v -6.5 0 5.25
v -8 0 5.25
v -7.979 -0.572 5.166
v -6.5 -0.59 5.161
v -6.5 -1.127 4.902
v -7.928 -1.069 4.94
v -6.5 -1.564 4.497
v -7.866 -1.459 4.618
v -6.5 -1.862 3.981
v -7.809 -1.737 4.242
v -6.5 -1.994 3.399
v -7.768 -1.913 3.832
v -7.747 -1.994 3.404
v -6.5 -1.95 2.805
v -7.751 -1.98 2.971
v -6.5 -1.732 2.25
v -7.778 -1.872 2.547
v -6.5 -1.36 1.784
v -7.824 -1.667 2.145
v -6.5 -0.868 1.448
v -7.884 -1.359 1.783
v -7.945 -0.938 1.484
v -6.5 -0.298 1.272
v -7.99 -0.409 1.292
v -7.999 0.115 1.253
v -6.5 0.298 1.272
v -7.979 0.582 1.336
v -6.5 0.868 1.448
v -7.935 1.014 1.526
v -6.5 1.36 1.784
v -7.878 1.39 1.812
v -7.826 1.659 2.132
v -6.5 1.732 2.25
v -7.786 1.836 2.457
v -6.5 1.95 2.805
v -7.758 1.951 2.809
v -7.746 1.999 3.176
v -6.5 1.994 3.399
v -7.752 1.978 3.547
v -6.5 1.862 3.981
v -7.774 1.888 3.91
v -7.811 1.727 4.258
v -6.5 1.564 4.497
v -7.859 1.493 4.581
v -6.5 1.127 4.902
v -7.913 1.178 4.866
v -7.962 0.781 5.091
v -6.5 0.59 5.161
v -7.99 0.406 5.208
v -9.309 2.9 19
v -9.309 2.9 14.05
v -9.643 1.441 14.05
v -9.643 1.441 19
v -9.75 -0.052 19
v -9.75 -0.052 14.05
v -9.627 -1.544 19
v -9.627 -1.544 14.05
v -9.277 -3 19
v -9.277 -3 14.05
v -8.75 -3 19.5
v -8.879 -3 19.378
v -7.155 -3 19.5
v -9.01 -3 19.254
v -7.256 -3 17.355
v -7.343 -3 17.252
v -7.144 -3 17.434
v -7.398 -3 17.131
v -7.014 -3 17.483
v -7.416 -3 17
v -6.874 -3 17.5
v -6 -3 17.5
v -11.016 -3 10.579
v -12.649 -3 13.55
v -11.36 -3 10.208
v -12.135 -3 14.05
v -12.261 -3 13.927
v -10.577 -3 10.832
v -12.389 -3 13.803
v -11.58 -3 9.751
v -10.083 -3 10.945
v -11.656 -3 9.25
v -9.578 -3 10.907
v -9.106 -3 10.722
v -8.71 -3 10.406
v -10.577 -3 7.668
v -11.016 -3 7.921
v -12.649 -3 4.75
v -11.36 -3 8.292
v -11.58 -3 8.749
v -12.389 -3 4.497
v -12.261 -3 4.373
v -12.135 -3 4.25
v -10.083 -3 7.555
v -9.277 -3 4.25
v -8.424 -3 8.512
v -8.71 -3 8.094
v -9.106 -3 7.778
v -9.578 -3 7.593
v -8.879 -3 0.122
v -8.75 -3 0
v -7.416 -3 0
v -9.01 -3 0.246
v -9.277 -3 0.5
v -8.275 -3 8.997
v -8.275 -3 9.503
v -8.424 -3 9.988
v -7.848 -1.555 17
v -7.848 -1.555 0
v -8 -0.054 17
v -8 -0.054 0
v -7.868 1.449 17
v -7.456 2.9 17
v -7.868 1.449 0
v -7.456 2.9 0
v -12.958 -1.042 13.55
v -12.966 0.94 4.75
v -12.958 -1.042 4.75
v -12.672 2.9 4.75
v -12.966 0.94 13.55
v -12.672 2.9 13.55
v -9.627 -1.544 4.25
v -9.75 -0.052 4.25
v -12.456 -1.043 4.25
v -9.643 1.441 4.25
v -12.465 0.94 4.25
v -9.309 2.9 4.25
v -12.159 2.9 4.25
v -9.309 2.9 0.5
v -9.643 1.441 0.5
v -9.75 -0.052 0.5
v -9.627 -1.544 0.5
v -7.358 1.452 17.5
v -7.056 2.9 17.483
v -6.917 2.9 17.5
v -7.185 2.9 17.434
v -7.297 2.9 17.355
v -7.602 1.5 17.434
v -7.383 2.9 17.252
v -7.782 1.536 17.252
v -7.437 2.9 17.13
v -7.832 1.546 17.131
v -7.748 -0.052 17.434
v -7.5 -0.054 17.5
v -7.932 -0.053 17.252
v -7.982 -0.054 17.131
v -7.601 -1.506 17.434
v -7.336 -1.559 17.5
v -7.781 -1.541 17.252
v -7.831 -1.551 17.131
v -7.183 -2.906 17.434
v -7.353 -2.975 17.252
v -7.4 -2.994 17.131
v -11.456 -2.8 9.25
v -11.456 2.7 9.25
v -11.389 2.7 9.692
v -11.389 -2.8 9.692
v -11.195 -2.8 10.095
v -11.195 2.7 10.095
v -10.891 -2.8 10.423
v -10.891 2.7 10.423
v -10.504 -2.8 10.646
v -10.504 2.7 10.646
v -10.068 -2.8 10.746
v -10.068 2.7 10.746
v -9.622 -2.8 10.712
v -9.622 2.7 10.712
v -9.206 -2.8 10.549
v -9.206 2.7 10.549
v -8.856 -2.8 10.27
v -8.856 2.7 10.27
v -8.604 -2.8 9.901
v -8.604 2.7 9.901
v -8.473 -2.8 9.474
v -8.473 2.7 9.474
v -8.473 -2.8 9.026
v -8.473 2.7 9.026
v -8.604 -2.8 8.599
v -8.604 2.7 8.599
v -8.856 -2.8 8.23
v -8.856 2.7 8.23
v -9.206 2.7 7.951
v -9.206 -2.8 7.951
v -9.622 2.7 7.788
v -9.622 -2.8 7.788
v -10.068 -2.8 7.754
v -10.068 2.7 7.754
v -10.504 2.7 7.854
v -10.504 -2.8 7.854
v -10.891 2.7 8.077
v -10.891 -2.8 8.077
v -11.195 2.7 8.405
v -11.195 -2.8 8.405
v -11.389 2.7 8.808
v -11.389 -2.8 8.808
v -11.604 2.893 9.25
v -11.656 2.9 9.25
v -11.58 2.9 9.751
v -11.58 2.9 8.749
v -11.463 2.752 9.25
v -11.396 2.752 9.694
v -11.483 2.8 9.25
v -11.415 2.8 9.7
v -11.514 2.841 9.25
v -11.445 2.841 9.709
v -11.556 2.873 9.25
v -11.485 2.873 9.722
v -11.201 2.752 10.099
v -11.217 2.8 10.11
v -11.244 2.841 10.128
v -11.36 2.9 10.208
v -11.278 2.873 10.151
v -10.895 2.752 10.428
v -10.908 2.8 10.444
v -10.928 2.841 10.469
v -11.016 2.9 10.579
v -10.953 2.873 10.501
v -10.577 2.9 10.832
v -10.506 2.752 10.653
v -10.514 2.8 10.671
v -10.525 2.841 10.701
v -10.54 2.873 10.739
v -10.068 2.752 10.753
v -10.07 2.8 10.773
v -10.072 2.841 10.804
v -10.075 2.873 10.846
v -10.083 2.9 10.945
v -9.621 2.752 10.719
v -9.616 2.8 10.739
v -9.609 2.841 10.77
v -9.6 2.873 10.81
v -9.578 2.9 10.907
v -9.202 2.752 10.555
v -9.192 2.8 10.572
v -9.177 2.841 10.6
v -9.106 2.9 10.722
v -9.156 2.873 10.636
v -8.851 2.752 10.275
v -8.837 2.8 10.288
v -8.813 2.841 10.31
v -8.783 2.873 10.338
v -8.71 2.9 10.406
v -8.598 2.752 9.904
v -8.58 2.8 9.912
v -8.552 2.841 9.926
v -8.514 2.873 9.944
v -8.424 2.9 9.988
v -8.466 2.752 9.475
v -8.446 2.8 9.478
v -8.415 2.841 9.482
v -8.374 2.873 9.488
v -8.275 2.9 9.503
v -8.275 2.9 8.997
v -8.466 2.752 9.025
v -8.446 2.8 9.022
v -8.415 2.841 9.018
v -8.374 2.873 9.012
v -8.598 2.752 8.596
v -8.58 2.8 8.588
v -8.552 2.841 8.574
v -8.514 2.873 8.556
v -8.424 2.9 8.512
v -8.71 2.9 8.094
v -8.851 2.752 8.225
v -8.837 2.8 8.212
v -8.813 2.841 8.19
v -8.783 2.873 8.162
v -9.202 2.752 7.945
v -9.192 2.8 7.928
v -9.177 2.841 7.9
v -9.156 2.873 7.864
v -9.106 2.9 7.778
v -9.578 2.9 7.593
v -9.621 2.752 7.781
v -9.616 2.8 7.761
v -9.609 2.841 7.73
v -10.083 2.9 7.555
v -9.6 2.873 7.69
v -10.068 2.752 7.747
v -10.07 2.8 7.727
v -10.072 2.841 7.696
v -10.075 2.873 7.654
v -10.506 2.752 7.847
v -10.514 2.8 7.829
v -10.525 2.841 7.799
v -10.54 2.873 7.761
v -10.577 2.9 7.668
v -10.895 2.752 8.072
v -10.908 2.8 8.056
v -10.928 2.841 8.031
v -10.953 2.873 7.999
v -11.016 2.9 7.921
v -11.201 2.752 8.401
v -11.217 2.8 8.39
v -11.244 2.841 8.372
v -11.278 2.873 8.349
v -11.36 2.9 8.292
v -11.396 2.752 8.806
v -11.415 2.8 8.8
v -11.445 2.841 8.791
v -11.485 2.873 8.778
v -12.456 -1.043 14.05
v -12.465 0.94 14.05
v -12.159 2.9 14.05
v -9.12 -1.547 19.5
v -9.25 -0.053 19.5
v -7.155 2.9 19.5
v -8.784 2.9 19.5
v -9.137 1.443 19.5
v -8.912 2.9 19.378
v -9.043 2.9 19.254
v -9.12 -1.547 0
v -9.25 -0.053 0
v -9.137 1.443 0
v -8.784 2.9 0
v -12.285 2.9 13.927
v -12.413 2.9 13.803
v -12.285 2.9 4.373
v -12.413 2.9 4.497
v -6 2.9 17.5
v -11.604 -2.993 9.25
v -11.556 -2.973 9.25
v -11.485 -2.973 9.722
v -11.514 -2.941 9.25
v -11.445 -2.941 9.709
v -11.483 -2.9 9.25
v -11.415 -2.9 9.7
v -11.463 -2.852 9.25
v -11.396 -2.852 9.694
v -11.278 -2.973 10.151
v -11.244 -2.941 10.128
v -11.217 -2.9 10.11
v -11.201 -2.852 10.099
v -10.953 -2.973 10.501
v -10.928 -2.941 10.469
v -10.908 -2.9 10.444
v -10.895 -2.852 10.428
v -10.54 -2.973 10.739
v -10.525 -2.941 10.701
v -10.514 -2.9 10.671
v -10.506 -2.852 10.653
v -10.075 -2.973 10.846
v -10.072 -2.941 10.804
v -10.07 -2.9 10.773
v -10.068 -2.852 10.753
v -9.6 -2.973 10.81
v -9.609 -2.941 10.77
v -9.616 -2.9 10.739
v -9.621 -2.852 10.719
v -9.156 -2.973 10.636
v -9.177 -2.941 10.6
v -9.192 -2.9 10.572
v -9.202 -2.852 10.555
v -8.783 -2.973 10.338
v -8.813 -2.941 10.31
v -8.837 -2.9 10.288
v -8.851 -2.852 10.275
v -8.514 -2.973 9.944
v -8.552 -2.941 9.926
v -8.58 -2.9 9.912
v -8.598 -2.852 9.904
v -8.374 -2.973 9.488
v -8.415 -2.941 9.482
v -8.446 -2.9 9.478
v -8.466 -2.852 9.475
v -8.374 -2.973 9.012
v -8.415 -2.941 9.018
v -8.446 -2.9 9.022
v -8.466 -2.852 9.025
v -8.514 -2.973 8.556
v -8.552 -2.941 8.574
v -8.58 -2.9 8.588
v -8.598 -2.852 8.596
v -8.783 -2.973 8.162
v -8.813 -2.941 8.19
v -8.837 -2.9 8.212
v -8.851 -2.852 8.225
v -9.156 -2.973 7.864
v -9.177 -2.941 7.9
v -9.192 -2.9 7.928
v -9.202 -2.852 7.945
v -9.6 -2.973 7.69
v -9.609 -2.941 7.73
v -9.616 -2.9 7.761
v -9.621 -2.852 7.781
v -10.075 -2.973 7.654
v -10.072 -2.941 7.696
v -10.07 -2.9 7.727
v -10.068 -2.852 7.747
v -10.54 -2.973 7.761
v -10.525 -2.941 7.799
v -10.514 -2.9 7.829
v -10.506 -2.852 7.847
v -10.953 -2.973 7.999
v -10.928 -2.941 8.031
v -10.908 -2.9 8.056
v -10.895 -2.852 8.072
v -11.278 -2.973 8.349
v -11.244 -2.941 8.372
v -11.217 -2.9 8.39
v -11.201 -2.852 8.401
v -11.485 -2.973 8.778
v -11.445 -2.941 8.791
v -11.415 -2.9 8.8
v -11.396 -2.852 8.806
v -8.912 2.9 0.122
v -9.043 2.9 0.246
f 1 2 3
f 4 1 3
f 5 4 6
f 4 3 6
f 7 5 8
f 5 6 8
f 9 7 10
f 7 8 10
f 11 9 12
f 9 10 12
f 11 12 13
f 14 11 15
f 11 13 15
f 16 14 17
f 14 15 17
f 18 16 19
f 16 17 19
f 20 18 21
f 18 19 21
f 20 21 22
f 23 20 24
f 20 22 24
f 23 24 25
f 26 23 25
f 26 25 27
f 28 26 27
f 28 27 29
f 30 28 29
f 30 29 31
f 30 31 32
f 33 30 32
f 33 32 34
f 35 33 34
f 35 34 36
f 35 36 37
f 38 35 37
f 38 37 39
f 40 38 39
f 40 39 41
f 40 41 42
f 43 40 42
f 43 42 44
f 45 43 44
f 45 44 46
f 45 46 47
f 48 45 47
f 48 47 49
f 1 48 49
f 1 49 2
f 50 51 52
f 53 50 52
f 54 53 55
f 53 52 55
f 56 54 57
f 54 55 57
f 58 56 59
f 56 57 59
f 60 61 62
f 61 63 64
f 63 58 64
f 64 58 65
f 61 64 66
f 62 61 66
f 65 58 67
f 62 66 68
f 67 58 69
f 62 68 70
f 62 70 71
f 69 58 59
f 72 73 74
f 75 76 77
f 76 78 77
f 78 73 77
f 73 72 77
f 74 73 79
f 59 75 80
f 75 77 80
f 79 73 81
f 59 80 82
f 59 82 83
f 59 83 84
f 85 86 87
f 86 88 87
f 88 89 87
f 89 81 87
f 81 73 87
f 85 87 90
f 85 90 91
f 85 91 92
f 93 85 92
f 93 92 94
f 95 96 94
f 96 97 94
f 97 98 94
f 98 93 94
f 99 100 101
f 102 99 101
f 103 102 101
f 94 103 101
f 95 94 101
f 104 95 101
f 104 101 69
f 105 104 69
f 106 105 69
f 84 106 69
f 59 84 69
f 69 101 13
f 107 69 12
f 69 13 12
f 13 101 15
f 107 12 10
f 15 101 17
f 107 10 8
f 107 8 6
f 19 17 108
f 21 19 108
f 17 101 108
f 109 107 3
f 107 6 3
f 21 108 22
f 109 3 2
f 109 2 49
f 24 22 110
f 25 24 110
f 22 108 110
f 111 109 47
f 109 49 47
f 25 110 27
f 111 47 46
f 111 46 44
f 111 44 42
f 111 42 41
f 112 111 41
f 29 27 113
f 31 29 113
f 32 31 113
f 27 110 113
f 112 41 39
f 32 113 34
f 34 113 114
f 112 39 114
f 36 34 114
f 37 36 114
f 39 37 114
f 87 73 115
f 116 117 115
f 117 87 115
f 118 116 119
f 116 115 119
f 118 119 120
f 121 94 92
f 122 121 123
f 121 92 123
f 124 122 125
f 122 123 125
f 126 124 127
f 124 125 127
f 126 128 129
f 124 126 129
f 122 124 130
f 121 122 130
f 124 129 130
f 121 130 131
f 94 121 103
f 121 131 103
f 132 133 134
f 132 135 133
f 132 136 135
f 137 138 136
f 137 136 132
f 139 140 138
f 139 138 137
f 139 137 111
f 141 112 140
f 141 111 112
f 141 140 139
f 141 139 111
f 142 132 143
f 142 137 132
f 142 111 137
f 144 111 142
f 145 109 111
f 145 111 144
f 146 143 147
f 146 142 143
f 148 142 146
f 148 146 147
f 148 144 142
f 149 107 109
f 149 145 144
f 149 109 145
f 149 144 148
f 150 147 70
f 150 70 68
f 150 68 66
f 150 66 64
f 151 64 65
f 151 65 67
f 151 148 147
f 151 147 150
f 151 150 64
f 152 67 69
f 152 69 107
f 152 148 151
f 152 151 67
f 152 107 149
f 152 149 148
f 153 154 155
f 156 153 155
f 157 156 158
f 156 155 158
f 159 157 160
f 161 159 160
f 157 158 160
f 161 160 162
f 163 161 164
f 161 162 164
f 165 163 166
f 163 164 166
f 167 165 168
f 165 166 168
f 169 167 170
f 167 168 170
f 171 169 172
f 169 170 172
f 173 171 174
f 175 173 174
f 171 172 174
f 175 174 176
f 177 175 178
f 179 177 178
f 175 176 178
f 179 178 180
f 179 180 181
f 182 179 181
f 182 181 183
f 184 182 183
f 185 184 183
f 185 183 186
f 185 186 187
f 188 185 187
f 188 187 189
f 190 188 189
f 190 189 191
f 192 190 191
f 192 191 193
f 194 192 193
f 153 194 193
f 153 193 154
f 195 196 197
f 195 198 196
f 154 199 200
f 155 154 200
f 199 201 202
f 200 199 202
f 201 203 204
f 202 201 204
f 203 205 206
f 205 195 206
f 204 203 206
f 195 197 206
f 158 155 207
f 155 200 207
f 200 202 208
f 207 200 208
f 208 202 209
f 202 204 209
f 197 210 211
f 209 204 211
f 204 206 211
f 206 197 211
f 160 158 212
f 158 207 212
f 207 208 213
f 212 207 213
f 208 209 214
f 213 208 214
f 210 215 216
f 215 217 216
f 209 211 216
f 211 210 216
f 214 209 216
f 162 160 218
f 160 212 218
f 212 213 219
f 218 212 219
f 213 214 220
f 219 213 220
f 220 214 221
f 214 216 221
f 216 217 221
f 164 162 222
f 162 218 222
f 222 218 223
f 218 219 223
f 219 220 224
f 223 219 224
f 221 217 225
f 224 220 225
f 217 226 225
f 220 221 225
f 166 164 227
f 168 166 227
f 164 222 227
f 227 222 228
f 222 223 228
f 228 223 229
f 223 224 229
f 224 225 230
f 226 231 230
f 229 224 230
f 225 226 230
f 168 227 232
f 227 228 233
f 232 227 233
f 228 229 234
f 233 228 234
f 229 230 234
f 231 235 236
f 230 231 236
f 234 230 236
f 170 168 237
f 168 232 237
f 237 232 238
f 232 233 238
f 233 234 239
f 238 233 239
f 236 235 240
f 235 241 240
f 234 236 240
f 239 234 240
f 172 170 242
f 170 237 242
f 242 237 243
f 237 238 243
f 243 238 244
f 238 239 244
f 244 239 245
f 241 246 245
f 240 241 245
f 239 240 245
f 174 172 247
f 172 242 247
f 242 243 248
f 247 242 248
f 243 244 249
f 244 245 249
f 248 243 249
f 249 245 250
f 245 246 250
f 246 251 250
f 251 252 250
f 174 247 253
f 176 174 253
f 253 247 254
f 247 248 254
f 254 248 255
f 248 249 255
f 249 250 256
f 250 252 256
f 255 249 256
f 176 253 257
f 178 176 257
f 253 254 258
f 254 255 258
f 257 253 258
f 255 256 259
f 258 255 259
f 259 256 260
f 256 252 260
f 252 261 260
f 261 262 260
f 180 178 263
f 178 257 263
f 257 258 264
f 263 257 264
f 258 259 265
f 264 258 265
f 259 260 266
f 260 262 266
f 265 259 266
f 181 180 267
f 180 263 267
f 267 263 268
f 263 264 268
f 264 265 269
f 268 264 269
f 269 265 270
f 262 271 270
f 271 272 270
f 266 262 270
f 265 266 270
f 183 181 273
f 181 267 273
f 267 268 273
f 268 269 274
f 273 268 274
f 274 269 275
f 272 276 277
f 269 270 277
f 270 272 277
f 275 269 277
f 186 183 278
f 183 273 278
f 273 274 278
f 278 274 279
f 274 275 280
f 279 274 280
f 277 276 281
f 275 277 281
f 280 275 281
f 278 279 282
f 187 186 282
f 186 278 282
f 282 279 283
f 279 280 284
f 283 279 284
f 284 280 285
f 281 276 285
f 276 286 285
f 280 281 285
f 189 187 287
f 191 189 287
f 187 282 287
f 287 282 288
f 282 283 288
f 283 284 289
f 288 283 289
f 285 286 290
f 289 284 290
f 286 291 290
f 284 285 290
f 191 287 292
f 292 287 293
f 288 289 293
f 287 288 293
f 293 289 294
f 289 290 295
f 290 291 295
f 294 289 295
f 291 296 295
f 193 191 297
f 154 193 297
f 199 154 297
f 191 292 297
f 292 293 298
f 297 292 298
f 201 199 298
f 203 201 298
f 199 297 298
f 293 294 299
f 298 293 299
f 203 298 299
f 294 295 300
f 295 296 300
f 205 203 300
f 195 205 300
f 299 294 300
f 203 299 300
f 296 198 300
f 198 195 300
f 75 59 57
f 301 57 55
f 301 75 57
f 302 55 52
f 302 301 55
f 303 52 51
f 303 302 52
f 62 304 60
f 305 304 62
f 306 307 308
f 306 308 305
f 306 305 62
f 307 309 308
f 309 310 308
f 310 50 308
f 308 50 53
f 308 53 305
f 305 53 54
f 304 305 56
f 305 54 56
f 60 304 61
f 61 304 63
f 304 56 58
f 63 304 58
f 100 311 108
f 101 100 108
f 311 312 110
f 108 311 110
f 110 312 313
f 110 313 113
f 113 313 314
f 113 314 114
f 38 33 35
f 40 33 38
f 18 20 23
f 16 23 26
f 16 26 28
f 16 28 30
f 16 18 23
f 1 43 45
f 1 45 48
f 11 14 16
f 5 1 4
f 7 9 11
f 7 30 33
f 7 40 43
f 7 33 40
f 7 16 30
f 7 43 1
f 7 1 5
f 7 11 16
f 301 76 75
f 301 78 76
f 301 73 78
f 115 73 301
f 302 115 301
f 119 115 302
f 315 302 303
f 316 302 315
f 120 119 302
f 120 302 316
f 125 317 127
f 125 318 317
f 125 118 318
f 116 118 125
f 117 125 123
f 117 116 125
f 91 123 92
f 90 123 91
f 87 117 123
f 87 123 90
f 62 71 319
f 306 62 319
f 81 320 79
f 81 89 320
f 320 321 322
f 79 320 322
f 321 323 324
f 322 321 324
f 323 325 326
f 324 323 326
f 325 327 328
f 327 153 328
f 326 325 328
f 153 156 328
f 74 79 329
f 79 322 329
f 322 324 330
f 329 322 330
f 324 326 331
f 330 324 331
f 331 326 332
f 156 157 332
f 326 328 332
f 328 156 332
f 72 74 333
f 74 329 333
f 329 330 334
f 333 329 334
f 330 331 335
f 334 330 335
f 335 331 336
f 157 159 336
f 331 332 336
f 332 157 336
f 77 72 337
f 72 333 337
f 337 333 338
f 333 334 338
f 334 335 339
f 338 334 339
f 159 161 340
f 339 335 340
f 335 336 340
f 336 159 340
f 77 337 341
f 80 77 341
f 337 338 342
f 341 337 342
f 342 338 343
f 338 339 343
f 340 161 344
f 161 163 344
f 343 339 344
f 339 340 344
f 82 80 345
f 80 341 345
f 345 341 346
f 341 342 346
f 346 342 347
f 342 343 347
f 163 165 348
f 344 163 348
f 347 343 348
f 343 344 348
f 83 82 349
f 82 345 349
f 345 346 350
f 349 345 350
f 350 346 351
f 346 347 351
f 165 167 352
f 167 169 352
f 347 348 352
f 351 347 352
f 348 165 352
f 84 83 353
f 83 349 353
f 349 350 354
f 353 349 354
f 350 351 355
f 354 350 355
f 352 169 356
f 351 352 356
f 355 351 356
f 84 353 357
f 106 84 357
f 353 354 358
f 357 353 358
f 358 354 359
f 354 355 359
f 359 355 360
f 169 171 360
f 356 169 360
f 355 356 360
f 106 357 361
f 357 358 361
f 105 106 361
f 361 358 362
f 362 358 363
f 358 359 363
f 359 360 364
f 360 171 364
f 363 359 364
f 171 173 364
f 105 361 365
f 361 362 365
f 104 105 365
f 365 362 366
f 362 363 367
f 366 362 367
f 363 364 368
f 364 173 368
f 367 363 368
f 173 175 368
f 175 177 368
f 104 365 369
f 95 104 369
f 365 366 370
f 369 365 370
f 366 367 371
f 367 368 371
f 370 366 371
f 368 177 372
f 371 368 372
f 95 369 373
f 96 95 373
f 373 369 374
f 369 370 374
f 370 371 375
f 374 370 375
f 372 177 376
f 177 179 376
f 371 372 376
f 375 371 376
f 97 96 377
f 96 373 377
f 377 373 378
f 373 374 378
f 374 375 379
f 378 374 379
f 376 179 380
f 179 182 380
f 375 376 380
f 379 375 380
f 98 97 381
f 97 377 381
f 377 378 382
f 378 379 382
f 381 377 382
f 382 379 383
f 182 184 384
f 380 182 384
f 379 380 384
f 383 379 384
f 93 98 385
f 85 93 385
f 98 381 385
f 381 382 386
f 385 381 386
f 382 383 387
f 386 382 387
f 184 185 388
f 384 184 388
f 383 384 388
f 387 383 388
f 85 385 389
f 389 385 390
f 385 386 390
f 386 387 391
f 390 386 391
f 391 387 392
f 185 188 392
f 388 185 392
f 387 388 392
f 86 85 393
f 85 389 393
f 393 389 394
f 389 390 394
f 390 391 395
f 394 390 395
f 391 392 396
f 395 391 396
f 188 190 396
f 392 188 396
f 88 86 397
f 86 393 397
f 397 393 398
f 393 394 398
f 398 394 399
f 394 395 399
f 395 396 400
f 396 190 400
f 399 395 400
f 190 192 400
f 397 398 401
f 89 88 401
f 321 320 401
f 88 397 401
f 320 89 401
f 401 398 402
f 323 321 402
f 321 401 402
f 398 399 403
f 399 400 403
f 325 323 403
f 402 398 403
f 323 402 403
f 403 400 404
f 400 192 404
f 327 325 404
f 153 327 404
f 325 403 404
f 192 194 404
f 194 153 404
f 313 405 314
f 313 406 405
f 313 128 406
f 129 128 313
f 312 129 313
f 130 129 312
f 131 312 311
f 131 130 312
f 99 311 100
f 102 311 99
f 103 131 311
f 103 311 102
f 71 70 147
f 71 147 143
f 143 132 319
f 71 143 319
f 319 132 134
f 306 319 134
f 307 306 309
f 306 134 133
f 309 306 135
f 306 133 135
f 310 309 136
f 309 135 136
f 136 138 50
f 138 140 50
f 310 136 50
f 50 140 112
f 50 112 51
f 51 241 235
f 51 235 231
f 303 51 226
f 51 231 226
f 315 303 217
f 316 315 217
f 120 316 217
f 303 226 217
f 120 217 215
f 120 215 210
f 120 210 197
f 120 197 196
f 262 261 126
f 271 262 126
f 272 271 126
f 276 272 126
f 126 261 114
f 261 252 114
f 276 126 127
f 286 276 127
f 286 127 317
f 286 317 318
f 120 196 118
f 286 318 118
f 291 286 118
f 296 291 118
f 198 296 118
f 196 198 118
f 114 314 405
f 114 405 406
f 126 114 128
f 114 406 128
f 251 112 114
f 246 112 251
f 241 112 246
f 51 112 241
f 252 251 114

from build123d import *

# Parameters (mm, degrees)
EXTRUDE_2_DEPTH     = 19.5
SKETCH_3_R          = 2
EXTRUDE_3_DEPTH     = 1.5
SKETCH_4_W          = 9.8
SKETCH_4_H          = 5.9
EXTRUDE_4_DEPTH     = 0.5
SKETCH_4_3_W        = 9.8
SKETCH_4_3_H        = 5.9
EXTRUDE_5_DEPTH     = 8
CUT_EXTRUDE_1_DEPTH = 23.835608234
SKETCH_7_R          = 1.5
CUT_EXTRUDE_2_DEPTH = 25.167333429
FILLET_1_R          = 0.2
SKETCH_8_W          = 2
SKETCH_8_H          = 5.9
EXTRUDE_6_DEPTH     = 2
CHAMFER_1_SIZE2     = 2
CHAMFER_1_SIZE      = 1.154700538
FILLET_2_R          = 0.5
CHAMFER_2_SIZE      = 0.5


with BuildPart() as part:
    # 스케치2 → 보스-돌출2 (new body)
    with BuildSketch(Plane.XY):
        with BuildLine():
            Line((-7.455870171, 2.9), (-9.308732459, 2.9))
            ThreePointArc((-9.308732459, 2.9), (-9.749858874, -0.052458871), (-9.276987658, -3))
            Line((-9.276987658, -3), (-7.416198487, -3))
            ThreePointArc((-7.416198487, -3), (-7.999819157, -0.053790897), (-7.455870171, 2.9))
        make_face()
    extrude(amount=EXTRUDE_2_DEPTH)

    # 스케치3 → 보스-돌출3 (add)
    with BuildSketch(Plane(origin=(-8, 0, 0), x_dir=(0, 0, -1), z_dir=(1, 0, 0))):
        with Locations(Location((-3.25, 0, 0), (0, 0, 180))):
            Circle(SKETCH_3_R)
    extrude(amount=EXTRUDE_3_DEPTH)

    # 스케치4 → 보스-돌출4 (add, symmetric)
    with BuildSketch(Plane.ZY.offset(9.75)):
        with Locations((9.15, -0.05)):
            Rectangle(SKETCH_4_W, SKETCH_4_H)
    extrude(amount=EXTRUDE_4_DEPTH, both=True)

    # 스케치4<3> → 보스-돌출5 (add)
    with BuildSketch(Plane.ZY.offset(9.75)):
        with Locations((9.15, -0.05)):
            Rectangle(SKETCH_4_3_W, SKETCH_4_3_H)
    extrude(amount=EXTRUDE_5_DEPTH)

    # 스케치6 → 컷-돌출1 (cut, through all)
    with BuildSketch(Plane.XY.offset(14.05)):
        with BuildLine():
            Line((-12.672410978, 2.9), (-17.75, 2.9))
            Line((-17.75, 2.9), (-17.75, -3))
            Line((-17.75, -3), (-12.649110641, -3))
            ThreePointArc((-12.649110641, -3), (-12.999898626, -0.051339326), (-12.672410978, 2.9))
        make_face()
    extrude(amount=-CUT_EXTRUDE_1_DEPTH, mode=Mode.SUBTRACT)

    # 스케치7 → 컷-돌출2 (cut, through all)
    with BuildSketch(Plane(origin=(0, 2.9, 0), x_dir=(1, 0, 0), z_dir=(0, 1, 0))):
        with Locations(Location((-9.955870171, -9.25, 0), (0, 0, 180))):
            Circle(SKETCH_7_R)
    extrude(amount=-CUT_EXTRUDE_2_DEPTH, mode=Mode.SUBTRACT)

    # 필렛1
    fillet_1_edges = [part.edges().sort_by_distance(p)[0] for p in [
        (-8.455870171, -3, 9.25),
        (-8.455870171, 2.9, 9.25),
    ]]
    fillet(fillet_1_edges, radius=FILLET_1_R)

    # 스케치8 → 보스-돌출6 (add)
    with BuildSketch(Plane(origin=(-8, 0, 0), x_dir=(0, 0, -1), z_dir=(1, 0, 0))):
        with Locations((-18.5, -0.05)):
            Rectangle(SKETCH_8_W, SKETCH_8_H)
    extrude(amount=EXTRUDE_6_DEPTH)

    # 모따기1
    chamfer_1_edges = [part.edges().sort_by_distance(p)[0] for p in [
        (-6, -0.05, 19.5),
    ]]
    chamfer_1_side = [part.faces().sort_by_distance(p)[0] for p in [
        (-6.023094011, -0.05, 19.5),
    ]]
    chamfer(chamfer_1_edges, length=CHAMFER_1_SIZE - 0.0001, length2=CHAMFER_1_SIZE2 - 0.0001, reference=chamfer_1_side[0])  # a hair under: the kernel refuses the full size

    # 필렛2
    fillet_2_edges = [part.edges().sort_by_distance(p)[0] for p in [
        (-7.999819157, -0.053790897, 17.5),
    ]]
    fillet(fillet_2_edges, radius=FILLET_2_R)

    # 모따기2
    chamfer_2_edges = [part.edges().sort_by_distance(p)[0] for p in [
        (-9.749858874, -0.052458871, 0),
        (-12.999898626, -0.051339326, 4.25),
        (-12.999898626, -0.051339326, 14.05),
        (-9.749858874, -0.052458871, 19.5),
    ]]
    chamfer(chamfer_2_edges, length=CHAMFER_2_SIZE)


solid = part.part
